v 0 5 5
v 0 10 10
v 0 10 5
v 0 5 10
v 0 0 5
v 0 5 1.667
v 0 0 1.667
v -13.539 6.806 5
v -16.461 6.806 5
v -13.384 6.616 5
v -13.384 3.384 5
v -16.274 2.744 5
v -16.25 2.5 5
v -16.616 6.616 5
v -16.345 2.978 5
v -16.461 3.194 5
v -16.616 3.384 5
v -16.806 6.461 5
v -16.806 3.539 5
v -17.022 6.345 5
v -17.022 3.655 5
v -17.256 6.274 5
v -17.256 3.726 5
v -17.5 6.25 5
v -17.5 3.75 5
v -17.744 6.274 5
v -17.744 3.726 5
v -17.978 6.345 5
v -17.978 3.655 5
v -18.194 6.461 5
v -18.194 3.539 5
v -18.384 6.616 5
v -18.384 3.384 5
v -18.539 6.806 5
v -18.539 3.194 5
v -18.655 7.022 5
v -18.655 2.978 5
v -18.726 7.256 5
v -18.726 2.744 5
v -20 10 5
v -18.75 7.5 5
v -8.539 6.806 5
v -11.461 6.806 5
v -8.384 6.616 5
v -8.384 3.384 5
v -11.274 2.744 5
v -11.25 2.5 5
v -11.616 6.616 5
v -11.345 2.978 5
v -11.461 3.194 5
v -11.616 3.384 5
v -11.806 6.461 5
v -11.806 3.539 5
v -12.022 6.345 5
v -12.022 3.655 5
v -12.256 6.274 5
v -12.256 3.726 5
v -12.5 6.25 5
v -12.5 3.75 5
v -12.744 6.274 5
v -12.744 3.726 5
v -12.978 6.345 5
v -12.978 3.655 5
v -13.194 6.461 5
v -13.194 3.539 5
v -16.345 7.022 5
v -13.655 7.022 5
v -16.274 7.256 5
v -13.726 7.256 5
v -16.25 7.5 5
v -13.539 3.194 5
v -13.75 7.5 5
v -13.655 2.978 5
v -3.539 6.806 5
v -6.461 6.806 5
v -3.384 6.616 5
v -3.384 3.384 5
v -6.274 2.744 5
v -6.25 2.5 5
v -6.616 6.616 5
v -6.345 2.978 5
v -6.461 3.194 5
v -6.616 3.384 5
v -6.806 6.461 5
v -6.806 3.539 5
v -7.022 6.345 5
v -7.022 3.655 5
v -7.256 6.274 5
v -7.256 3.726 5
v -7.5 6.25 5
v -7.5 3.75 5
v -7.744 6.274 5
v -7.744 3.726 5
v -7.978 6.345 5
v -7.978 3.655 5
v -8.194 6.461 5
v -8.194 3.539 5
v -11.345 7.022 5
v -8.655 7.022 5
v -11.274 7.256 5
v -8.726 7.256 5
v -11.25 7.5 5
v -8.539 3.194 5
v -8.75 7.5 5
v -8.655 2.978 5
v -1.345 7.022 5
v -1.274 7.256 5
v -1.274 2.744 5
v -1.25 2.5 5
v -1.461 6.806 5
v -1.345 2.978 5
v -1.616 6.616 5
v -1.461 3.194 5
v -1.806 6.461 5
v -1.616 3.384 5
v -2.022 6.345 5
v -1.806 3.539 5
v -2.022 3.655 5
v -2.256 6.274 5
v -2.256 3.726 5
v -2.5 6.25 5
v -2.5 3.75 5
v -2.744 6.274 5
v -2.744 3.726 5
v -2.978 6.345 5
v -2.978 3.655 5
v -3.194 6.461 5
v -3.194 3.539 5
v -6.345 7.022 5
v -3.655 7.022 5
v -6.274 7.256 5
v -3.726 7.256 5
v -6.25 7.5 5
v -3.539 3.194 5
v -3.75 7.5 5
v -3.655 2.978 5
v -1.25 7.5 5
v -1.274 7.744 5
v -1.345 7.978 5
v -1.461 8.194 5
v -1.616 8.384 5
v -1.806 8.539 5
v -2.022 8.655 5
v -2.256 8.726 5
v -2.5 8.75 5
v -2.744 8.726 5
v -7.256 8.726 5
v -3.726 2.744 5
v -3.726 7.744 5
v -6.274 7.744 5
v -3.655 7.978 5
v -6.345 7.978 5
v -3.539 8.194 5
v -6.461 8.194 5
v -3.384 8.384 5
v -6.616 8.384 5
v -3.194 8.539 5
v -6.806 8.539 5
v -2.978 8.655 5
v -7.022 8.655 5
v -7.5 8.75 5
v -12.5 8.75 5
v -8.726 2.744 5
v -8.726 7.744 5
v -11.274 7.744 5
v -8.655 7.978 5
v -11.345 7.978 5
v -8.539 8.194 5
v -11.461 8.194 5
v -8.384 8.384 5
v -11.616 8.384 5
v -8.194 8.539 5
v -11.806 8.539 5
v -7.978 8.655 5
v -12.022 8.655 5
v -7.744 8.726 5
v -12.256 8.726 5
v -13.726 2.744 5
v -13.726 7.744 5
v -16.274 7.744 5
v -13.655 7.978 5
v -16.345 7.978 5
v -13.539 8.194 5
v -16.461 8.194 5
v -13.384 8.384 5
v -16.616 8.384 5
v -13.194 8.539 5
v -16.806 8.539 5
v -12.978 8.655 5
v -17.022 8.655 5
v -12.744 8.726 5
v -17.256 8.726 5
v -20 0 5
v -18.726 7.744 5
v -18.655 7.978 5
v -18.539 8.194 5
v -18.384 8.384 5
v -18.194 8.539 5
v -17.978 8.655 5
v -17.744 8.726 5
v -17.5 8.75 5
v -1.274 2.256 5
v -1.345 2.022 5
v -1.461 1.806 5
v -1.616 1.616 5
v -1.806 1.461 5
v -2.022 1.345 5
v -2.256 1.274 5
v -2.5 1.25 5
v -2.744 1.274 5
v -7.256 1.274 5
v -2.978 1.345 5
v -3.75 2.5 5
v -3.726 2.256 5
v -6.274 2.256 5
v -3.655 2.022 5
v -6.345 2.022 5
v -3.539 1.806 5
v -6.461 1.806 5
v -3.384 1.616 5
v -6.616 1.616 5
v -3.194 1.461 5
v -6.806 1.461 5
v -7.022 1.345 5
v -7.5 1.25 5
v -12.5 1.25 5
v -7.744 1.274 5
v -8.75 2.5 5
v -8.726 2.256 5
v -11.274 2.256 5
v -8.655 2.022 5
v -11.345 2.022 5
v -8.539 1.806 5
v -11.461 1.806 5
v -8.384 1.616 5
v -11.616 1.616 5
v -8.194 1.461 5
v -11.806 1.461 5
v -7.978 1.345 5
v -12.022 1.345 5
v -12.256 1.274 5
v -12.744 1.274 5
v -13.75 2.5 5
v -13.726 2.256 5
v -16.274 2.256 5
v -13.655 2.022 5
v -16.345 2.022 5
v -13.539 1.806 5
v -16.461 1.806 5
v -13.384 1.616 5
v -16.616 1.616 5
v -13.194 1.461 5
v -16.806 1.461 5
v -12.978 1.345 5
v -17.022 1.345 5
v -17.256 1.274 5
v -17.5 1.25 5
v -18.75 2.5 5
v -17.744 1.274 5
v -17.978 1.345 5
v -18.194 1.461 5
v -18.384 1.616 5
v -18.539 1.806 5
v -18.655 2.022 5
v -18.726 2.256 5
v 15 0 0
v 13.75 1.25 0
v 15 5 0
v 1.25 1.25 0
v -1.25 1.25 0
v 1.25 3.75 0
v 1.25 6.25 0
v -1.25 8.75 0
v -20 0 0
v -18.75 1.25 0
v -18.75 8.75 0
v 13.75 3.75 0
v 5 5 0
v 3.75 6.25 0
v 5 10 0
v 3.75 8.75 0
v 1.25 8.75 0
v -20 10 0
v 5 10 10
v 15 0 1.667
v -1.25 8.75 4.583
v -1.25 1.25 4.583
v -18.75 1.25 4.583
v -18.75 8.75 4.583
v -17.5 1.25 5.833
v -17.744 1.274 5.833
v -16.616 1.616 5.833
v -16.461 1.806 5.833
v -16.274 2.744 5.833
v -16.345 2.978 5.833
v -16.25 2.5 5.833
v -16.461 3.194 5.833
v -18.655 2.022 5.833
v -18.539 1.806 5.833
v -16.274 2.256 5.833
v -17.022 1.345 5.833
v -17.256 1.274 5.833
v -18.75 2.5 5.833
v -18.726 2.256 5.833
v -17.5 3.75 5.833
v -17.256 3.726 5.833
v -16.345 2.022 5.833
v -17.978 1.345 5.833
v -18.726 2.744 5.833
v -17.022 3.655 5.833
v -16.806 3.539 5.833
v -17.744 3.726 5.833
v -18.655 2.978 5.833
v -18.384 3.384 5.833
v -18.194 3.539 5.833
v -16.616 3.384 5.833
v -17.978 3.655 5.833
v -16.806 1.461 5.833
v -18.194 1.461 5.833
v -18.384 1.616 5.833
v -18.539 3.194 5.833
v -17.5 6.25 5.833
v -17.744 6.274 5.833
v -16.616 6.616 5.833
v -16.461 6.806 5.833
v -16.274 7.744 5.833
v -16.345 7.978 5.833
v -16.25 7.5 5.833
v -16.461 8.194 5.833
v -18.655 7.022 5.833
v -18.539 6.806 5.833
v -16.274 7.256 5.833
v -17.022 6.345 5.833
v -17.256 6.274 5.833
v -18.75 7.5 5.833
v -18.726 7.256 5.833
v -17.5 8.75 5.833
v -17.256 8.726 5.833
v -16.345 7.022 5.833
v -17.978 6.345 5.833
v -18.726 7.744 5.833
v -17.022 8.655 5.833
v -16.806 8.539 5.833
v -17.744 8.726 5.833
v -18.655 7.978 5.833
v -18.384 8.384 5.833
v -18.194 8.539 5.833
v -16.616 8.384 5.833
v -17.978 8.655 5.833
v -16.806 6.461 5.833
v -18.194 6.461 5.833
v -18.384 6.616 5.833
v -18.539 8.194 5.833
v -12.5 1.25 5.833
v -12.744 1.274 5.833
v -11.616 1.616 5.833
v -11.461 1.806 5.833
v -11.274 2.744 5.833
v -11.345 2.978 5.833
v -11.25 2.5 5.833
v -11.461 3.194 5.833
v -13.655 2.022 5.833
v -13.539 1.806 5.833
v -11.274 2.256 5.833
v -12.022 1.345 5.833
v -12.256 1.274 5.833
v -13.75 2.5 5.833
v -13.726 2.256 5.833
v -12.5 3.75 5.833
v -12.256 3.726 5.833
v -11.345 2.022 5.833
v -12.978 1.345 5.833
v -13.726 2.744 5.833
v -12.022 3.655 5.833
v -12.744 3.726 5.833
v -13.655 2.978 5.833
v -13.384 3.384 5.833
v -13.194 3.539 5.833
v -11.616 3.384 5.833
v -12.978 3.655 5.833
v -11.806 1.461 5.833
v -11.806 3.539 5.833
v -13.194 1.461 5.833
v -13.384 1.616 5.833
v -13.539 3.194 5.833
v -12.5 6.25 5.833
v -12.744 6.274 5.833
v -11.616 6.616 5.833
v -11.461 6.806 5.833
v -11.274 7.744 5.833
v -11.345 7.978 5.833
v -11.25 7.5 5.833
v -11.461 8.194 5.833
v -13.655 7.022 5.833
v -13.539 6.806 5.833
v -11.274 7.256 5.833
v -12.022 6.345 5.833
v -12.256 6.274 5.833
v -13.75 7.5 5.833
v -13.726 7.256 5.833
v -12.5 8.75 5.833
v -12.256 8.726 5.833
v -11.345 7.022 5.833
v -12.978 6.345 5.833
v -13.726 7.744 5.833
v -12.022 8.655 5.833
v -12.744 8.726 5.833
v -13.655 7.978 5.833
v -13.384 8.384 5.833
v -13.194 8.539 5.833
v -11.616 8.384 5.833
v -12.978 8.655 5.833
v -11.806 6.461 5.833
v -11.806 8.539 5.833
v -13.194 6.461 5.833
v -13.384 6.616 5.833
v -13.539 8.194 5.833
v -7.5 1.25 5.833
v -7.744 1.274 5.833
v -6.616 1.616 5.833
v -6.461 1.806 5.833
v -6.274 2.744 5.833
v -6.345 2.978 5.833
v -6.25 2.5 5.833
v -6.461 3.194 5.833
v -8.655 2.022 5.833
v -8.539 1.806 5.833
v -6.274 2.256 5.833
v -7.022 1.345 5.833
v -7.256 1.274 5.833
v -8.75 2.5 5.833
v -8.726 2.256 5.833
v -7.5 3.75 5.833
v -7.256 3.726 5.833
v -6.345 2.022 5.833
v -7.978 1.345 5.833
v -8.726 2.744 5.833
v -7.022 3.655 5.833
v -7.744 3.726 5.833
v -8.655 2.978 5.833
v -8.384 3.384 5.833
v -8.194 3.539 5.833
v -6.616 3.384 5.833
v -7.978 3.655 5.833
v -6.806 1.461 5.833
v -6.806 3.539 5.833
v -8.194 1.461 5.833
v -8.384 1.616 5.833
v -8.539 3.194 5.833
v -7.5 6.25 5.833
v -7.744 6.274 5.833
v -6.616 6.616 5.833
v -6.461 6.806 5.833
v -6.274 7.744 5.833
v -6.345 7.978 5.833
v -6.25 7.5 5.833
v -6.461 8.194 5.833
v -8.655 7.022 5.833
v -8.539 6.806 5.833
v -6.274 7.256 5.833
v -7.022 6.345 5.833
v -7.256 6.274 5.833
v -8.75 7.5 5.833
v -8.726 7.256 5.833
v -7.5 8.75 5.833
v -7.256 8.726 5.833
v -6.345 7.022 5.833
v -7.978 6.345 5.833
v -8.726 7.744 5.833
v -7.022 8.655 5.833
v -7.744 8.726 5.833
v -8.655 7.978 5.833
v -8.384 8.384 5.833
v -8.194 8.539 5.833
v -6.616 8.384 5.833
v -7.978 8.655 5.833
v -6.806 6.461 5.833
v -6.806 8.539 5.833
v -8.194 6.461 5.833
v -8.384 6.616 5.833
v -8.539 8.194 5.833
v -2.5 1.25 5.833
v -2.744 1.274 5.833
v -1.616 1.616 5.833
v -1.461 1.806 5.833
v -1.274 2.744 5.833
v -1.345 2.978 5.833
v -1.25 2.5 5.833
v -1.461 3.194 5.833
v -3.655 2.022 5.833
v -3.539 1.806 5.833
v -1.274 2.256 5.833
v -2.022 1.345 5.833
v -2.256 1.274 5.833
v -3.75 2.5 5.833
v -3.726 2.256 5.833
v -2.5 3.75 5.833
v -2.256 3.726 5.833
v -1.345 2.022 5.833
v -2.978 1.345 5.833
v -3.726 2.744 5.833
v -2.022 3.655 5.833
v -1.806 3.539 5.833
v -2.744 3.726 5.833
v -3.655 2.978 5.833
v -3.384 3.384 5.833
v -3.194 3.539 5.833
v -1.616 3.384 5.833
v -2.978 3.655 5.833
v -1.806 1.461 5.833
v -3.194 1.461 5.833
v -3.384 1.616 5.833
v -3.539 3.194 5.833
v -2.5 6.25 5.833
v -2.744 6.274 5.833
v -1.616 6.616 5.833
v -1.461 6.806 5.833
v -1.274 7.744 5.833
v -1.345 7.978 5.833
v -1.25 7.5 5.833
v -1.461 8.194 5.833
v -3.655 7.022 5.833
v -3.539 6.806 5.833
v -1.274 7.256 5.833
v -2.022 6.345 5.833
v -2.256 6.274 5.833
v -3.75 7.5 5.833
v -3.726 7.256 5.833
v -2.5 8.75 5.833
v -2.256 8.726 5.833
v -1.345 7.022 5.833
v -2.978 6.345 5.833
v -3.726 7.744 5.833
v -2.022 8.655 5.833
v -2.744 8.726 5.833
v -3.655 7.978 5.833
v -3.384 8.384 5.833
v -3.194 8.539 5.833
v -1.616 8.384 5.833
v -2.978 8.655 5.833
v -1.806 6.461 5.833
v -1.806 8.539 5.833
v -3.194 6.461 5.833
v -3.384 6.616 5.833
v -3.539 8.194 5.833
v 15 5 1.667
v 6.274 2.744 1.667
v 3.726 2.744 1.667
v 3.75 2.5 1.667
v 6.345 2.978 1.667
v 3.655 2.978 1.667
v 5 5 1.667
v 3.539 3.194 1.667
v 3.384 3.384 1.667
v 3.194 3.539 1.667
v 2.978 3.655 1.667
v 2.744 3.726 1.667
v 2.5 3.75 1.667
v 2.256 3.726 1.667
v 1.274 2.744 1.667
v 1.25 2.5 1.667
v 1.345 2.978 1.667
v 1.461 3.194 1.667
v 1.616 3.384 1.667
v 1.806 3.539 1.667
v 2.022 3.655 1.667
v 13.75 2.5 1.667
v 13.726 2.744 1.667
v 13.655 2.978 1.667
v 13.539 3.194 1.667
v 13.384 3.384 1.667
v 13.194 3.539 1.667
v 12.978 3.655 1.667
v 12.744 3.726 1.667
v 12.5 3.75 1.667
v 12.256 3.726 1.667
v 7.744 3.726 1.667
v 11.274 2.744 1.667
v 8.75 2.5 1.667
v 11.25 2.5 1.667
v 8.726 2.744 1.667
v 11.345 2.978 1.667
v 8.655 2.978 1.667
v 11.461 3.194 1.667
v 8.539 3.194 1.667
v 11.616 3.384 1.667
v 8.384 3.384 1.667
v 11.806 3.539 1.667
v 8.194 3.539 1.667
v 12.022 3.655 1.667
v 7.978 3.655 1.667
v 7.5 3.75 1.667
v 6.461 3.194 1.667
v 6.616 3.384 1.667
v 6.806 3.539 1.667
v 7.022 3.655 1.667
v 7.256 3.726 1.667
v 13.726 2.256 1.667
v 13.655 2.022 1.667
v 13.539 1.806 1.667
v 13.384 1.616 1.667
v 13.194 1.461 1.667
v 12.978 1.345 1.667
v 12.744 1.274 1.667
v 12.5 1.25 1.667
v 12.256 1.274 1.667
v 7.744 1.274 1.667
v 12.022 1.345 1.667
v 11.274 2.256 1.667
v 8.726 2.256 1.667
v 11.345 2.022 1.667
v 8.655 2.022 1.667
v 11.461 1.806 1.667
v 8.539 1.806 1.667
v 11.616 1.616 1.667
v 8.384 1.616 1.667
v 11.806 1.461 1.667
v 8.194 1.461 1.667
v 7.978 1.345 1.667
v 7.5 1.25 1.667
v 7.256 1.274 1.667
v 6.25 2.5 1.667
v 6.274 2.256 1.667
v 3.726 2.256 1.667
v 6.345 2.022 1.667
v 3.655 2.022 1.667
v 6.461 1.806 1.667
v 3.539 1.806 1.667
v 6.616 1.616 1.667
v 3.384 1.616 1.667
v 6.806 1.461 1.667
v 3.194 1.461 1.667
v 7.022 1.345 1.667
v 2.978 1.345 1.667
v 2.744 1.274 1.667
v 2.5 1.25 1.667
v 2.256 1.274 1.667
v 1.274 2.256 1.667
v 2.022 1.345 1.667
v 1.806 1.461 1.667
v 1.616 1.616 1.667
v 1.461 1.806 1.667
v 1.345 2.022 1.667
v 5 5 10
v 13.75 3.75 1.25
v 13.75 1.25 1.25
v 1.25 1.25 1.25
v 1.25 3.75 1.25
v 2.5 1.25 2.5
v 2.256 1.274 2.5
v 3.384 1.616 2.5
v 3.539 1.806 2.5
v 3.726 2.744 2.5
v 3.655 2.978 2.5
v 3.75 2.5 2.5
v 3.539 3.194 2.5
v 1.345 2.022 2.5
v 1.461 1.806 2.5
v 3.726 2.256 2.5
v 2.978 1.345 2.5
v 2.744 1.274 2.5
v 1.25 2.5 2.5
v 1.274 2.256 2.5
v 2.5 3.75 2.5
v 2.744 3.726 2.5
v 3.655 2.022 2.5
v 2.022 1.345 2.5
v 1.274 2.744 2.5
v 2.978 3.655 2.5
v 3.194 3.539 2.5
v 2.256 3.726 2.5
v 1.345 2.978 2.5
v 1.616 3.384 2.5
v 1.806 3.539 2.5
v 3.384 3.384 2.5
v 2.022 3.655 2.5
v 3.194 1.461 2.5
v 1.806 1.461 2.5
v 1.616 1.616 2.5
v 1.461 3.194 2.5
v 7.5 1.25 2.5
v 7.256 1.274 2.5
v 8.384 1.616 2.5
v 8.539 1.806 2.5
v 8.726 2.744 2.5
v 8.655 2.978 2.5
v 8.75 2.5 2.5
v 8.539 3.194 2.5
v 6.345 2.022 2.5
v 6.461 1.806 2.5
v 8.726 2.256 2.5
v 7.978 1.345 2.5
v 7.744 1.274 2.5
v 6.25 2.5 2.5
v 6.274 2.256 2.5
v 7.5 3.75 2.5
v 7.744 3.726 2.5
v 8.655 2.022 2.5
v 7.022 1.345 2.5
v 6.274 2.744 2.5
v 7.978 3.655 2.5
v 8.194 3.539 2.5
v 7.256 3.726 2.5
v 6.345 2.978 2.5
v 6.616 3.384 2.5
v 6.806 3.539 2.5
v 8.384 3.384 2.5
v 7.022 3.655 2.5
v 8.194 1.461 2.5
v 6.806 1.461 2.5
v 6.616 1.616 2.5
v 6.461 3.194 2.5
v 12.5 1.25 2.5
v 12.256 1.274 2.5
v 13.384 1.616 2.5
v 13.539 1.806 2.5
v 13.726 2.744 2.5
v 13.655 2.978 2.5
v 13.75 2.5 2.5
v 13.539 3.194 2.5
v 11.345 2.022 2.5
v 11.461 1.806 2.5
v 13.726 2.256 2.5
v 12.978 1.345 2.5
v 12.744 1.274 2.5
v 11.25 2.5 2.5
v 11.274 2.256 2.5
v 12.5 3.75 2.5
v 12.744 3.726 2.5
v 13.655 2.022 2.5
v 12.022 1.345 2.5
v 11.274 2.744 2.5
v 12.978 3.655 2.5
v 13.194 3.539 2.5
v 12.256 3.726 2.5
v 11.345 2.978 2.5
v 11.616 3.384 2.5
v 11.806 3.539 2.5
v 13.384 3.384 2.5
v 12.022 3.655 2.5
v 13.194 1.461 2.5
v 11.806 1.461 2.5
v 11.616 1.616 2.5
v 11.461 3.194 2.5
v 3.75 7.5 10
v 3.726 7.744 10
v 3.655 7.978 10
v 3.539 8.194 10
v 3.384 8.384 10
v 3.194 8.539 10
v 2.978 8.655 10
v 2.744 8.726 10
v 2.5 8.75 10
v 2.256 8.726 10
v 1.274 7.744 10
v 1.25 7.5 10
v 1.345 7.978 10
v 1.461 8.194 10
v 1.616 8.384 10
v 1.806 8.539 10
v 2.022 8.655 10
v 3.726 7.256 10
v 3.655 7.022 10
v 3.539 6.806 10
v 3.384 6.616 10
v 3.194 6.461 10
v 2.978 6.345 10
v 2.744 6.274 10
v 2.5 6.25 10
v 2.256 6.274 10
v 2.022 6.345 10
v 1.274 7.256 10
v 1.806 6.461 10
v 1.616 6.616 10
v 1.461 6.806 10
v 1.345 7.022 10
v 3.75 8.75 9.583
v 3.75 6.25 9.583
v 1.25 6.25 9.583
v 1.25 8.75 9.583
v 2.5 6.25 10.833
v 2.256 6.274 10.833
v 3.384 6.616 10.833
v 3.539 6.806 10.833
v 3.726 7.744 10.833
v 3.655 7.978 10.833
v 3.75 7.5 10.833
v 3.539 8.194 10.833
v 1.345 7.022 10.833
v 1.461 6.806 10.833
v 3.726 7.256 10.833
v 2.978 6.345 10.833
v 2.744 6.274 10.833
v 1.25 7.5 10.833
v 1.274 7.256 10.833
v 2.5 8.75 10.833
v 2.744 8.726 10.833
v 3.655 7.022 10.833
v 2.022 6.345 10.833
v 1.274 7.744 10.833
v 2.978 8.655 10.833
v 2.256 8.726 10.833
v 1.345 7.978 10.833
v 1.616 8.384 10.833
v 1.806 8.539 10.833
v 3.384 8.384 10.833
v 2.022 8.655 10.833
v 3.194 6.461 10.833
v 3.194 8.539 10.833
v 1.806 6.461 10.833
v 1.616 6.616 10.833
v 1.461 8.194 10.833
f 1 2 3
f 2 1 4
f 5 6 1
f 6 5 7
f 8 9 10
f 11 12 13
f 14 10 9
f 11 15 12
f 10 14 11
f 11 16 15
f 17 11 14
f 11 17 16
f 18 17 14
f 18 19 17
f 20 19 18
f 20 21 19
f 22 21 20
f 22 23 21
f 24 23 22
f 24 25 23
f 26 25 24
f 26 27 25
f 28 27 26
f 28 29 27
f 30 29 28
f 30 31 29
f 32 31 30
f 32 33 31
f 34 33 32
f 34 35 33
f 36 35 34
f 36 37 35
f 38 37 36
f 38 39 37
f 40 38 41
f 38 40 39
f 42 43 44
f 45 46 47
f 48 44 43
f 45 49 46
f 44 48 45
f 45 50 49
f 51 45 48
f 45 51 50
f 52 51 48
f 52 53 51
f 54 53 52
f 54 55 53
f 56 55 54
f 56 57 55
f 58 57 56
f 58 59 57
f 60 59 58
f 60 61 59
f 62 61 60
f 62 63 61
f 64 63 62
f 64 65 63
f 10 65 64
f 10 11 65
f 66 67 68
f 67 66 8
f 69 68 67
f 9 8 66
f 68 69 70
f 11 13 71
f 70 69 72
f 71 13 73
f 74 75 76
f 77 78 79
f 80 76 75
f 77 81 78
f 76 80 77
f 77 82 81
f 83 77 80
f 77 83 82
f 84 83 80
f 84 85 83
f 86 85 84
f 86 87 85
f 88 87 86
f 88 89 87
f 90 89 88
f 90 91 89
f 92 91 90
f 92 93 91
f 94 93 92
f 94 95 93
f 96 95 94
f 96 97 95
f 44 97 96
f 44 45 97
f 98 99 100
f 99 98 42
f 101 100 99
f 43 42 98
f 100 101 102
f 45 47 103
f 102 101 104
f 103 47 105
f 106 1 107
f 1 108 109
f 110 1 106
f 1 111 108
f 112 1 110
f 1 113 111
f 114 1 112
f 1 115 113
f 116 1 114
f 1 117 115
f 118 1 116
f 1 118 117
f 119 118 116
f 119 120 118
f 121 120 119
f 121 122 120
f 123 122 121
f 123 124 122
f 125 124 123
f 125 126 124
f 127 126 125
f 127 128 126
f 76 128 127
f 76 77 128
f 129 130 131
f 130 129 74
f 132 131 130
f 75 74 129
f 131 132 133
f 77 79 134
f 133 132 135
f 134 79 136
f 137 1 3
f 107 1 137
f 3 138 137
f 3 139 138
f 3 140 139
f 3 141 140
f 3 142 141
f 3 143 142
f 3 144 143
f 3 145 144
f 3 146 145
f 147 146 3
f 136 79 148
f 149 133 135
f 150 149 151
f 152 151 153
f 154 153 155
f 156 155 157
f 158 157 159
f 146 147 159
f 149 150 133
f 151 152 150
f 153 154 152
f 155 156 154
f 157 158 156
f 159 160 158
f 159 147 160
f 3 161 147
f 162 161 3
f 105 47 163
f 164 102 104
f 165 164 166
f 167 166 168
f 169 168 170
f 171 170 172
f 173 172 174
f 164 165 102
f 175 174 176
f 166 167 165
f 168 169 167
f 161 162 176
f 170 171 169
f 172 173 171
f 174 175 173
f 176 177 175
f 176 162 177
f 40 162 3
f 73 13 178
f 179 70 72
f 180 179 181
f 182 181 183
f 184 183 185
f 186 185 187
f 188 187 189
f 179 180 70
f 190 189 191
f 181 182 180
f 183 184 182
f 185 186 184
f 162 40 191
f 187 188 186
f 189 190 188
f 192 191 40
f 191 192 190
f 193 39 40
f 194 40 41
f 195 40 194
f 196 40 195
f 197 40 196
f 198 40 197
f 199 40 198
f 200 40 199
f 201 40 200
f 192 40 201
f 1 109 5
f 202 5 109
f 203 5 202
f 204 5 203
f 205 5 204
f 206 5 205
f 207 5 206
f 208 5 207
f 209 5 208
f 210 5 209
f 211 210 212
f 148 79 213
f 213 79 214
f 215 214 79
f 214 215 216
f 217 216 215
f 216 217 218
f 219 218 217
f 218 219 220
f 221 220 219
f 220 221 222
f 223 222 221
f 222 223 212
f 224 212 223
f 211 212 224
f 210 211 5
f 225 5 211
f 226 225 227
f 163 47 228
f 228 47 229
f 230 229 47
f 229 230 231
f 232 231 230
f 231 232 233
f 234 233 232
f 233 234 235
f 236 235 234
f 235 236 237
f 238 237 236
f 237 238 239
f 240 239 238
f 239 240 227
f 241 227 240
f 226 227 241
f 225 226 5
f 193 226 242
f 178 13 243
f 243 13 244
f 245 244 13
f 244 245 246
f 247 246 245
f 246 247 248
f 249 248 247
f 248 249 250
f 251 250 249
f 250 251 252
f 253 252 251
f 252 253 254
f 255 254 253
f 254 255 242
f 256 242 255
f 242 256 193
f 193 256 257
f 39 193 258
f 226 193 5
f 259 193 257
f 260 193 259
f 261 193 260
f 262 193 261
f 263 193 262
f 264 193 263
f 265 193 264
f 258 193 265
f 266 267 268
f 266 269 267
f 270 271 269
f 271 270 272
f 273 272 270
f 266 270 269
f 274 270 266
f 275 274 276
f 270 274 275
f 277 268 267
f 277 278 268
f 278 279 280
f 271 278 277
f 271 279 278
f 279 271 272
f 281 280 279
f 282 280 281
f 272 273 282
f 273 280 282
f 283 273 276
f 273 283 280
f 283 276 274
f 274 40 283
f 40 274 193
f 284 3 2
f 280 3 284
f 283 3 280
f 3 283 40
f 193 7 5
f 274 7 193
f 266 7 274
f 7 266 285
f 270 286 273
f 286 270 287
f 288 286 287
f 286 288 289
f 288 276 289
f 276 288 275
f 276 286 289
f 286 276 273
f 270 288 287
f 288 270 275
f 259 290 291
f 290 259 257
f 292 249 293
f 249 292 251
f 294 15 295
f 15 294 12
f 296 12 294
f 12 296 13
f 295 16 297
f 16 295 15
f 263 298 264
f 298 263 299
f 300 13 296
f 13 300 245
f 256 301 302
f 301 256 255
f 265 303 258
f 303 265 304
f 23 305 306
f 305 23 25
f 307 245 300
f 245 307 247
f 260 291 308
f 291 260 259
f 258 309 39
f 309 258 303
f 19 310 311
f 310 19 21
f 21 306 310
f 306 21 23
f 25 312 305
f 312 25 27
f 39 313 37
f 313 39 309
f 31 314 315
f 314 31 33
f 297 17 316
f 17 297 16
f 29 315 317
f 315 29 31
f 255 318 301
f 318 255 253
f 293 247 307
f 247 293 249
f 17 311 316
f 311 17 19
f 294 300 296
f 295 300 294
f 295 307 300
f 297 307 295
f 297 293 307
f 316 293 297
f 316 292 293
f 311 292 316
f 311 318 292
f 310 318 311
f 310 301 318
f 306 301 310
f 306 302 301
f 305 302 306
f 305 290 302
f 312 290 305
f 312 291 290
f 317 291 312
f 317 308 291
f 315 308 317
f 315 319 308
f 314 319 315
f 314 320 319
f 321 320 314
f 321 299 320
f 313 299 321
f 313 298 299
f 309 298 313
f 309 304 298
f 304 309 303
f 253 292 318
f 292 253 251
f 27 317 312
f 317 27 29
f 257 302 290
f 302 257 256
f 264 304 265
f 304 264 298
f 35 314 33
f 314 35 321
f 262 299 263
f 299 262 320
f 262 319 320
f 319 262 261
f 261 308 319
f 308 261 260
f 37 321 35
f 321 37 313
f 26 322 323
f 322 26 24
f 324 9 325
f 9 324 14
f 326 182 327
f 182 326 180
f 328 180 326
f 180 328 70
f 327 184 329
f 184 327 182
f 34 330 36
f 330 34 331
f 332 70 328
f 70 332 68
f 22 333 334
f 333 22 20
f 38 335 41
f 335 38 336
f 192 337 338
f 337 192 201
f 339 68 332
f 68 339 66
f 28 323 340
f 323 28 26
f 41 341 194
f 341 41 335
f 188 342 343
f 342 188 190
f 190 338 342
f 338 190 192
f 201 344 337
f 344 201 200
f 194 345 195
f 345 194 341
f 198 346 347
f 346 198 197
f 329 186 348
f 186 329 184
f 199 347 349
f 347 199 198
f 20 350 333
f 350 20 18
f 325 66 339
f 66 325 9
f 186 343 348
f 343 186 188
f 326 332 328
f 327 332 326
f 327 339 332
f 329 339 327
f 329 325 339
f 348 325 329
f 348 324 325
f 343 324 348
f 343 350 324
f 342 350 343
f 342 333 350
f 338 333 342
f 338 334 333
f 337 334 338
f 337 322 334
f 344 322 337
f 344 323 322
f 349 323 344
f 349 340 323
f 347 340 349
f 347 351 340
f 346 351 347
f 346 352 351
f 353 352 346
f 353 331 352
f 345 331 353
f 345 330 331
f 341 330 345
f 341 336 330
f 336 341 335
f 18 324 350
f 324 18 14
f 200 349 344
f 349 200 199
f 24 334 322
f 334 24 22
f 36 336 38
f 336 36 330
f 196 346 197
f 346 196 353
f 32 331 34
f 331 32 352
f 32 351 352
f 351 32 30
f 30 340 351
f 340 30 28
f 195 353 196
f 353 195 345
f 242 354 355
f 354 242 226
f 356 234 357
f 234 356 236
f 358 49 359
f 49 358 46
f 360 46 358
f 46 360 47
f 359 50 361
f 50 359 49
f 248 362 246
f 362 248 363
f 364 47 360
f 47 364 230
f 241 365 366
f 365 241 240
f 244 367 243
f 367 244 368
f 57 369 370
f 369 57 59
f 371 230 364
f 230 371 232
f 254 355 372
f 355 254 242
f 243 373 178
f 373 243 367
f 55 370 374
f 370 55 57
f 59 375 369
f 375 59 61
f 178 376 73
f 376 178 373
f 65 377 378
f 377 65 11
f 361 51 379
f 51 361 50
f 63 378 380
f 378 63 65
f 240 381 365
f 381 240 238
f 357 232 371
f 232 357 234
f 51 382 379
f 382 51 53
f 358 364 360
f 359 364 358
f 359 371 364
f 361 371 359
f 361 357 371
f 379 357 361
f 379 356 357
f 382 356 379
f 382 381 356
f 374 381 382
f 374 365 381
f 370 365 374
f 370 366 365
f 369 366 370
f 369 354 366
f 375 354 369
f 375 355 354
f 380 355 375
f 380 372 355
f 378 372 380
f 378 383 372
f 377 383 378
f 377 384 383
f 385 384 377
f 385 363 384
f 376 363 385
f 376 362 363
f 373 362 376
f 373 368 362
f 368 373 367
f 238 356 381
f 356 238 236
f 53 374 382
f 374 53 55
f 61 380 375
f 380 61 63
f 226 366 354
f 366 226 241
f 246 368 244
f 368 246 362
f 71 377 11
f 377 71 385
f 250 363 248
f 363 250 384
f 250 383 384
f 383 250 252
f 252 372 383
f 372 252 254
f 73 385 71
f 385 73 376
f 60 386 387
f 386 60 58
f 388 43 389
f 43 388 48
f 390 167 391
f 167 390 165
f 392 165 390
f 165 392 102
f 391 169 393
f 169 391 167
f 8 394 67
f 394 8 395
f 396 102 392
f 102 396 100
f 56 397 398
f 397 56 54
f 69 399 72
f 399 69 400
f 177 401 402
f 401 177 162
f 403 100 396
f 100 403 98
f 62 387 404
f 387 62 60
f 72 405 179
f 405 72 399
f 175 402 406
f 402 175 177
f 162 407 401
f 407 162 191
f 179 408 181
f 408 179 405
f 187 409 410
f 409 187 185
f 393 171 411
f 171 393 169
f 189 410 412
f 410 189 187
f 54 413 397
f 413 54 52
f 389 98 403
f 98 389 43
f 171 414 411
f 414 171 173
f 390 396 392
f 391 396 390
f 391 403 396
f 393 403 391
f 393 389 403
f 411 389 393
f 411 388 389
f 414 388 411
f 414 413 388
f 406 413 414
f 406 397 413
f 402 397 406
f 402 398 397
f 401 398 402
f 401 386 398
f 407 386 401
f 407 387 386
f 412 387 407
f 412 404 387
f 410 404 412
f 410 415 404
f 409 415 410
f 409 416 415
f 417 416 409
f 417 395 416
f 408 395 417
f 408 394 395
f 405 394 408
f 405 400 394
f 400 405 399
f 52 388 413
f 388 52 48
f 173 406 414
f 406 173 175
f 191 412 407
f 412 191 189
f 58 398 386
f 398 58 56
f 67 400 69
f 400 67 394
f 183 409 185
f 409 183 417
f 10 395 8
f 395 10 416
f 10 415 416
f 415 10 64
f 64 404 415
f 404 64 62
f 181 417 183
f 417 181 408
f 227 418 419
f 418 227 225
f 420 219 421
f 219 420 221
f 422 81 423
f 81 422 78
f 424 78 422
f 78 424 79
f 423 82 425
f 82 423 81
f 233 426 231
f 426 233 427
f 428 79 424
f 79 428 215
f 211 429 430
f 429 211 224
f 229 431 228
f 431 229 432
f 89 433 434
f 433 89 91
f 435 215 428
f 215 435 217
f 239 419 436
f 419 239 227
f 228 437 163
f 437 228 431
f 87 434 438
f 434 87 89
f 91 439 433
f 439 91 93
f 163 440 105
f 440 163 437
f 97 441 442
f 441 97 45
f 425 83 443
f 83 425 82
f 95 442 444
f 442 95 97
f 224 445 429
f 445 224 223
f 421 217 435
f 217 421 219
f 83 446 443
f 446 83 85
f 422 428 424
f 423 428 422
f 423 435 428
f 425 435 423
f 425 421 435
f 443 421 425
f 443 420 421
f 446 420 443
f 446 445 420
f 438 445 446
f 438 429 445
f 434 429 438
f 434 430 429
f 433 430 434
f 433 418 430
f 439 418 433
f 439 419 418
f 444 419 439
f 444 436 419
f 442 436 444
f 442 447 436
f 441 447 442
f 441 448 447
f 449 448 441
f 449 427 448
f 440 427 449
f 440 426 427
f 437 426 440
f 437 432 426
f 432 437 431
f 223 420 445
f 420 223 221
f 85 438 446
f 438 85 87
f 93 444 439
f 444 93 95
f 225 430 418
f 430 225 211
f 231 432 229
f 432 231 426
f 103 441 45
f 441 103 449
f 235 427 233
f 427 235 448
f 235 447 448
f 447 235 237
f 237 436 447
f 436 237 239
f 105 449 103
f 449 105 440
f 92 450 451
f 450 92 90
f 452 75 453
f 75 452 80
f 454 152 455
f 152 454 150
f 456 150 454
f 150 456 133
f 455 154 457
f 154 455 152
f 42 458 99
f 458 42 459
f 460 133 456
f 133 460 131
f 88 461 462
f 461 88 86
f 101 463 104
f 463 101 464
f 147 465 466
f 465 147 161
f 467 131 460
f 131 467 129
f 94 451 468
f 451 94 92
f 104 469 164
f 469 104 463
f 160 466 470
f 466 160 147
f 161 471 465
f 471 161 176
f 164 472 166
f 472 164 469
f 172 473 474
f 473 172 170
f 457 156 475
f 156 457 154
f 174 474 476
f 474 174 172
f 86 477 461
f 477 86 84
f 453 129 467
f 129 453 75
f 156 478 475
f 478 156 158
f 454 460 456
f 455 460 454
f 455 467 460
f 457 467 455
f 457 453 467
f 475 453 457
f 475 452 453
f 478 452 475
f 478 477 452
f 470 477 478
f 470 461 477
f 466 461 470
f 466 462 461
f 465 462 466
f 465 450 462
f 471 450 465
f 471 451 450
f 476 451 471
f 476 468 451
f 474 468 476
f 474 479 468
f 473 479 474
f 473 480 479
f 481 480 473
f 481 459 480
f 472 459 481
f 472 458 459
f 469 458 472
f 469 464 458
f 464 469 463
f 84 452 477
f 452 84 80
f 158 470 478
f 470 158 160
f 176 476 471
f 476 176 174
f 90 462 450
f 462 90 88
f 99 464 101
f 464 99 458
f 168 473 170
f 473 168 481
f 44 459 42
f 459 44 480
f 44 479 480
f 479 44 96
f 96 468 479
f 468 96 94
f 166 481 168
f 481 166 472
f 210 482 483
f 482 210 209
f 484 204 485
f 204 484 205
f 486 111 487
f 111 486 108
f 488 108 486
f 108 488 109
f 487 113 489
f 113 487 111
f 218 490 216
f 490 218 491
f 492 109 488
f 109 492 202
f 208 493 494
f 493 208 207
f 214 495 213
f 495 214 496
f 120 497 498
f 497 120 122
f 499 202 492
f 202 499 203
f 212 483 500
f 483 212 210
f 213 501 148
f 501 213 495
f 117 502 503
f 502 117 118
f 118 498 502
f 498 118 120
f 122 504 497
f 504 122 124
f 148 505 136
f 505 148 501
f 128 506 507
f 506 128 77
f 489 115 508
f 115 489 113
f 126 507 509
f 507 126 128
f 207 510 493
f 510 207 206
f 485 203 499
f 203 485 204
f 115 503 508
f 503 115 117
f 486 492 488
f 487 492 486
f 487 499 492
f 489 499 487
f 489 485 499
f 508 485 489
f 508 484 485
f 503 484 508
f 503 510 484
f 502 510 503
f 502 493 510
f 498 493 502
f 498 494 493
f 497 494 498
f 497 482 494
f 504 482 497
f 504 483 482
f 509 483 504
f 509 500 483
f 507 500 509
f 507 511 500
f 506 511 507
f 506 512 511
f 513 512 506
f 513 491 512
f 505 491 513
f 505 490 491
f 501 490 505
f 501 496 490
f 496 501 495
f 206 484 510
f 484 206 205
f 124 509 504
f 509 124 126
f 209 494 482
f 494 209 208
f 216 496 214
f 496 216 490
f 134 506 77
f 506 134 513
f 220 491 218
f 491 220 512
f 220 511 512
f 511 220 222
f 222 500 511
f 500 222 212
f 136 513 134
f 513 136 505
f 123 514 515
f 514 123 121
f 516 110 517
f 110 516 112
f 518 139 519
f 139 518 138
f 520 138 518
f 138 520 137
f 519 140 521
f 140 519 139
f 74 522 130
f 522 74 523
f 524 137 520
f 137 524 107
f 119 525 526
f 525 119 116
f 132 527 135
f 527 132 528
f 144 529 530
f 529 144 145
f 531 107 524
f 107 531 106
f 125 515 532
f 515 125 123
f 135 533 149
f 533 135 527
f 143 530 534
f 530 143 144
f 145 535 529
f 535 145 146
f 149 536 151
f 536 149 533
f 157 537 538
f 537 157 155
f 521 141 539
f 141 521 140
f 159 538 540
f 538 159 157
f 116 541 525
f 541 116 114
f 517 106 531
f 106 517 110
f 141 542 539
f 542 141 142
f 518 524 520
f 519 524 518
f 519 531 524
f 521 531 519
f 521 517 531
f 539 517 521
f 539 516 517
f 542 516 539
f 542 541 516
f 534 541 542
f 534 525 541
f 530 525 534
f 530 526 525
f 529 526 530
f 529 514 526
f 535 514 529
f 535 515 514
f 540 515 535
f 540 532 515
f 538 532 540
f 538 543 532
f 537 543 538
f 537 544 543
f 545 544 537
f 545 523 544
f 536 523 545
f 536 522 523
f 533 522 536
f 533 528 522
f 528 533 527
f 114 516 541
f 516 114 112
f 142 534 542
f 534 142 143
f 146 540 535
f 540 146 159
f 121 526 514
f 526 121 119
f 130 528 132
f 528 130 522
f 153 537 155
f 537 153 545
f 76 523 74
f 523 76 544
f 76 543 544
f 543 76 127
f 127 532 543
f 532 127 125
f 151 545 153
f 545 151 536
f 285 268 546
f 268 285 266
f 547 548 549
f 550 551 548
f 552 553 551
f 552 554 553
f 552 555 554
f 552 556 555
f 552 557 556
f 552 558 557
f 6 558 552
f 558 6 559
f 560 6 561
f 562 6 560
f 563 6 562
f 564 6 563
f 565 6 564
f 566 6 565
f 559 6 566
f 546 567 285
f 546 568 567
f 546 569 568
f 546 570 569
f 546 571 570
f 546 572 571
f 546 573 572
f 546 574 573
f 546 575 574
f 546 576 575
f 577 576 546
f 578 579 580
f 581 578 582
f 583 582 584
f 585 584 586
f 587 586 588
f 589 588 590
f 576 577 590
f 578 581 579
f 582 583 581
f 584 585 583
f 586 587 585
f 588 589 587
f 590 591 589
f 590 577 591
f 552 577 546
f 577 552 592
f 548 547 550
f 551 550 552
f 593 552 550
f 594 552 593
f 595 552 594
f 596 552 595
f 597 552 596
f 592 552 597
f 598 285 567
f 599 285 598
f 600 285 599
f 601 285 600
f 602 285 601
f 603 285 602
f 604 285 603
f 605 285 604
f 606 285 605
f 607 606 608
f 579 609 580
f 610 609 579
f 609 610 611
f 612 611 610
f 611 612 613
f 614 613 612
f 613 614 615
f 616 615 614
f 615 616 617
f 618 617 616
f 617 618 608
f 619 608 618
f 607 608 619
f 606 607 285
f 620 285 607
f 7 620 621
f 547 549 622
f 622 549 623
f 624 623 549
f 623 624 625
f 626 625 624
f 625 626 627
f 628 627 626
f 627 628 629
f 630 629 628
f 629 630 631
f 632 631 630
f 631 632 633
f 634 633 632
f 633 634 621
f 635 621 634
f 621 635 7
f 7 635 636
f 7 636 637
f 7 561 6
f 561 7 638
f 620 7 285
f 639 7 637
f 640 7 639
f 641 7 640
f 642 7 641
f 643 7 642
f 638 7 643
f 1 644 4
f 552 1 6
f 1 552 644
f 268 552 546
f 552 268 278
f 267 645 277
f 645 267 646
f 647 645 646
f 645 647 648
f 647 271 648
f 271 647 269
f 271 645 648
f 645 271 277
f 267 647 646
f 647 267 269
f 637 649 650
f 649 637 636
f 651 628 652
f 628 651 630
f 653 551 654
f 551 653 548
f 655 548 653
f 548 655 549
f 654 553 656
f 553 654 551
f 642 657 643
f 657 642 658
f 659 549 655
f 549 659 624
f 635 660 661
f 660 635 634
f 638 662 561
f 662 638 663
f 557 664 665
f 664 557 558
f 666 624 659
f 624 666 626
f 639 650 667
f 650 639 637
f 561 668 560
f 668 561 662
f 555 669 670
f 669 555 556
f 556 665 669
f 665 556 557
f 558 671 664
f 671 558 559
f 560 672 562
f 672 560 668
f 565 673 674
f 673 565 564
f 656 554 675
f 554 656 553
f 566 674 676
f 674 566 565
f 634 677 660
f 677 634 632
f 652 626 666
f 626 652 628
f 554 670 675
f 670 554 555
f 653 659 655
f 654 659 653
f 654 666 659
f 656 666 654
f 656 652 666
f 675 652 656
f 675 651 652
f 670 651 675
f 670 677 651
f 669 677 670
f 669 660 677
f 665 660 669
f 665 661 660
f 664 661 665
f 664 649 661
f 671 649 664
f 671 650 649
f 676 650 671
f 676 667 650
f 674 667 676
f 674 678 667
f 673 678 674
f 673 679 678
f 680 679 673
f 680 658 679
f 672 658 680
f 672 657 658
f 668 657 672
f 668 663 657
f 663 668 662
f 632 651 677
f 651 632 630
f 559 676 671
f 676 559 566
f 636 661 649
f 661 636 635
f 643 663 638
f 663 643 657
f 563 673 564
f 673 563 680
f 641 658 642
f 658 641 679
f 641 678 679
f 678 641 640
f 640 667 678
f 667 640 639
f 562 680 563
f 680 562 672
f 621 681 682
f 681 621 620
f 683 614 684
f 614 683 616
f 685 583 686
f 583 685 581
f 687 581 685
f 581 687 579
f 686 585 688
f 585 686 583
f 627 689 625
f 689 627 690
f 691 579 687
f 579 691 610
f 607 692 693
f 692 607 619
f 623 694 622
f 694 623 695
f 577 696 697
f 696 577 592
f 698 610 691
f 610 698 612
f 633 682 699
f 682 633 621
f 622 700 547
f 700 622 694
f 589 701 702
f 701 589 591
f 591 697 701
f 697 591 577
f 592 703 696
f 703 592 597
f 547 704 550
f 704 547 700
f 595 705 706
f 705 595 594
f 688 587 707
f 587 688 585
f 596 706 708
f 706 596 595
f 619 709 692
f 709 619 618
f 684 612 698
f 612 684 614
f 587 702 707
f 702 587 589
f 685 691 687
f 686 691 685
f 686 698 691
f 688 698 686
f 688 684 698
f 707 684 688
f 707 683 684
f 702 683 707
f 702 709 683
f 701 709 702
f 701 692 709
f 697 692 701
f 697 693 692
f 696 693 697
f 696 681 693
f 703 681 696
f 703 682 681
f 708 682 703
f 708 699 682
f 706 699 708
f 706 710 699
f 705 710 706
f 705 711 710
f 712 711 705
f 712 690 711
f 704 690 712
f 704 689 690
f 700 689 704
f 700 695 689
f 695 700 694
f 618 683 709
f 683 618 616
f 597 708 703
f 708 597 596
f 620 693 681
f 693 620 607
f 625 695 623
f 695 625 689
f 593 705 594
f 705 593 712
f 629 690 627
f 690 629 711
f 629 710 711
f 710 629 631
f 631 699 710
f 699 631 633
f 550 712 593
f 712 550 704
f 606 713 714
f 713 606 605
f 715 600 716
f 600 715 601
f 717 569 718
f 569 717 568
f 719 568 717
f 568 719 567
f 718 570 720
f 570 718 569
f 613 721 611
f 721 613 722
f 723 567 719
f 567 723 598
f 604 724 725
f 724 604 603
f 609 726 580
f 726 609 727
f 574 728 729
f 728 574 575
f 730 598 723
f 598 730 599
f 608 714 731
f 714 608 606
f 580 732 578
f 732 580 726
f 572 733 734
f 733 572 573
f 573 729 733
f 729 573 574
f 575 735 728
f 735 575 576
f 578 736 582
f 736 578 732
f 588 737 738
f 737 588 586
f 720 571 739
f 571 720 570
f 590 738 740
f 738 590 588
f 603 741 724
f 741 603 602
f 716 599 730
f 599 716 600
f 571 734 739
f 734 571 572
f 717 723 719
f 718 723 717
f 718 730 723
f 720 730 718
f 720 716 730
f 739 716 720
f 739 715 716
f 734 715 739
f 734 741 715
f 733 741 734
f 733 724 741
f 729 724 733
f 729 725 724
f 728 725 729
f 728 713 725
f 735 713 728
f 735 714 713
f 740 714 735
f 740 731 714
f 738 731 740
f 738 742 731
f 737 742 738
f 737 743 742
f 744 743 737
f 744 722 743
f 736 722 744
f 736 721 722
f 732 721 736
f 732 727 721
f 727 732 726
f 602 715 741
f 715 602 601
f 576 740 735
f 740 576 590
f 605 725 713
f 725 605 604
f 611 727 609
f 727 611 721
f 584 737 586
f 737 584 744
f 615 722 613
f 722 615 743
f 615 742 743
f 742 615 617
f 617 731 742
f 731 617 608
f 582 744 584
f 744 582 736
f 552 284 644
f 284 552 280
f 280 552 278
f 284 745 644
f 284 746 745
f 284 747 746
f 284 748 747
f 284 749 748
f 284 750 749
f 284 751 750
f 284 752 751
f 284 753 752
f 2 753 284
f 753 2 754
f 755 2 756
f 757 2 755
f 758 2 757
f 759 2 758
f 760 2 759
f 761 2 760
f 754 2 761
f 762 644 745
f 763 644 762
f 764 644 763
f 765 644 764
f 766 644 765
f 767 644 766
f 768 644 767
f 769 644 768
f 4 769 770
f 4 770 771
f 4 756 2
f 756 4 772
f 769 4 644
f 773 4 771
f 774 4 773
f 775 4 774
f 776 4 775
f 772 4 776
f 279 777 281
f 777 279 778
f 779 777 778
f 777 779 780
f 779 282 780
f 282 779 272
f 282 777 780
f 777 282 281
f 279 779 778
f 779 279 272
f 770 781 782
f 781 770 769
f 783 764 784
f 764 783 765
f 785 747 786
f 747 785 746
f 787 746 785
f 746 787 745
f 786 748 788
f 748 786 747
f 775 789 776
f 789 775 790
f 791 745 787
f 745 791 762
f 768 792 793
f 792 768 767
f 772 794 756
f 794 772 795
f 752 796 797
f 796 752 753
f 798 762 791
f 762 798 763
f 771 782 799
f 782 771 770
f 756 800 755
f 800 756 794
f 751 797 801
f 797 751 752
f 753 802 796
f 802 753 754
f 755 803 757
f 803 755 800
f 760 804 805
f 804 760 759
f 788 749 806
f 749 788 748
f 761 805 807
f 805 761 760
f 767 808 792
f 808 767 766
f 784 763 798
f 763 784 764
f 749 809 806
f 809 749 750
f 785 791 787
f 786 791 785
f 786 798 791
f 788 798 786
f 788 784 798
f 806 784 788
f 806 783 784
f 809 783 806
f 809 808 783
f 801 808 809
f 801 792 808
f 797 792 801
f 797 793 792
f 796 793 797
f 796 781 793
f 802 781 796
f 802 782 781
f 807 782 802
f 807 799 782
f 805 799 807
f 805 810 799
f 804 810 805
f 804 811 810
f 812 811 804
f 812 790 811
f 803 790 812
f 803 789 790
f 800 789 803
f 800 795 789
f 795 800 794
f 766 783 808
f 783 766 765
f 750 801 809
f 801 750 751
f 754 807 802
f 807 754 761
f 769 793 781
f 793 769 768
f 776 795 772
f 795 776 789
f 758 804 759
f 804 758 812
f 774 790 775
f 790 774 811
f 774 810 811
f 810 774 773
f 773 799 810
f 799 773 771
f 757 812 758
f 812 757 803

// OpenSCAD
unit = 5;

module lego(w, h, d, c = "white") {
  color(c)
  scale(unit)
  union() {
    difference() {
      cube([w, h, d]);

      dhole = d*2 - 1/6;
      translate([0.25, 0.25, -dhole/2])
      cube([w - 0.5, h - 0.5, dhole]);
    }

    for (i = [0 : w - 1])
      for (j = [0 : h - 1])
        translate([i + 1/2, j + 1/2, d])
          cylinder(1/6, d = 0.5, $fn = 32);
  }
}

translate([-4*unit, 0, 0])
lego(4, 2, 1, "lightblue");

lego(3, 1, 1/3, "crimson");

translate([0, 1*unit, 0])
lego(1, 1, 2, "yellow");
